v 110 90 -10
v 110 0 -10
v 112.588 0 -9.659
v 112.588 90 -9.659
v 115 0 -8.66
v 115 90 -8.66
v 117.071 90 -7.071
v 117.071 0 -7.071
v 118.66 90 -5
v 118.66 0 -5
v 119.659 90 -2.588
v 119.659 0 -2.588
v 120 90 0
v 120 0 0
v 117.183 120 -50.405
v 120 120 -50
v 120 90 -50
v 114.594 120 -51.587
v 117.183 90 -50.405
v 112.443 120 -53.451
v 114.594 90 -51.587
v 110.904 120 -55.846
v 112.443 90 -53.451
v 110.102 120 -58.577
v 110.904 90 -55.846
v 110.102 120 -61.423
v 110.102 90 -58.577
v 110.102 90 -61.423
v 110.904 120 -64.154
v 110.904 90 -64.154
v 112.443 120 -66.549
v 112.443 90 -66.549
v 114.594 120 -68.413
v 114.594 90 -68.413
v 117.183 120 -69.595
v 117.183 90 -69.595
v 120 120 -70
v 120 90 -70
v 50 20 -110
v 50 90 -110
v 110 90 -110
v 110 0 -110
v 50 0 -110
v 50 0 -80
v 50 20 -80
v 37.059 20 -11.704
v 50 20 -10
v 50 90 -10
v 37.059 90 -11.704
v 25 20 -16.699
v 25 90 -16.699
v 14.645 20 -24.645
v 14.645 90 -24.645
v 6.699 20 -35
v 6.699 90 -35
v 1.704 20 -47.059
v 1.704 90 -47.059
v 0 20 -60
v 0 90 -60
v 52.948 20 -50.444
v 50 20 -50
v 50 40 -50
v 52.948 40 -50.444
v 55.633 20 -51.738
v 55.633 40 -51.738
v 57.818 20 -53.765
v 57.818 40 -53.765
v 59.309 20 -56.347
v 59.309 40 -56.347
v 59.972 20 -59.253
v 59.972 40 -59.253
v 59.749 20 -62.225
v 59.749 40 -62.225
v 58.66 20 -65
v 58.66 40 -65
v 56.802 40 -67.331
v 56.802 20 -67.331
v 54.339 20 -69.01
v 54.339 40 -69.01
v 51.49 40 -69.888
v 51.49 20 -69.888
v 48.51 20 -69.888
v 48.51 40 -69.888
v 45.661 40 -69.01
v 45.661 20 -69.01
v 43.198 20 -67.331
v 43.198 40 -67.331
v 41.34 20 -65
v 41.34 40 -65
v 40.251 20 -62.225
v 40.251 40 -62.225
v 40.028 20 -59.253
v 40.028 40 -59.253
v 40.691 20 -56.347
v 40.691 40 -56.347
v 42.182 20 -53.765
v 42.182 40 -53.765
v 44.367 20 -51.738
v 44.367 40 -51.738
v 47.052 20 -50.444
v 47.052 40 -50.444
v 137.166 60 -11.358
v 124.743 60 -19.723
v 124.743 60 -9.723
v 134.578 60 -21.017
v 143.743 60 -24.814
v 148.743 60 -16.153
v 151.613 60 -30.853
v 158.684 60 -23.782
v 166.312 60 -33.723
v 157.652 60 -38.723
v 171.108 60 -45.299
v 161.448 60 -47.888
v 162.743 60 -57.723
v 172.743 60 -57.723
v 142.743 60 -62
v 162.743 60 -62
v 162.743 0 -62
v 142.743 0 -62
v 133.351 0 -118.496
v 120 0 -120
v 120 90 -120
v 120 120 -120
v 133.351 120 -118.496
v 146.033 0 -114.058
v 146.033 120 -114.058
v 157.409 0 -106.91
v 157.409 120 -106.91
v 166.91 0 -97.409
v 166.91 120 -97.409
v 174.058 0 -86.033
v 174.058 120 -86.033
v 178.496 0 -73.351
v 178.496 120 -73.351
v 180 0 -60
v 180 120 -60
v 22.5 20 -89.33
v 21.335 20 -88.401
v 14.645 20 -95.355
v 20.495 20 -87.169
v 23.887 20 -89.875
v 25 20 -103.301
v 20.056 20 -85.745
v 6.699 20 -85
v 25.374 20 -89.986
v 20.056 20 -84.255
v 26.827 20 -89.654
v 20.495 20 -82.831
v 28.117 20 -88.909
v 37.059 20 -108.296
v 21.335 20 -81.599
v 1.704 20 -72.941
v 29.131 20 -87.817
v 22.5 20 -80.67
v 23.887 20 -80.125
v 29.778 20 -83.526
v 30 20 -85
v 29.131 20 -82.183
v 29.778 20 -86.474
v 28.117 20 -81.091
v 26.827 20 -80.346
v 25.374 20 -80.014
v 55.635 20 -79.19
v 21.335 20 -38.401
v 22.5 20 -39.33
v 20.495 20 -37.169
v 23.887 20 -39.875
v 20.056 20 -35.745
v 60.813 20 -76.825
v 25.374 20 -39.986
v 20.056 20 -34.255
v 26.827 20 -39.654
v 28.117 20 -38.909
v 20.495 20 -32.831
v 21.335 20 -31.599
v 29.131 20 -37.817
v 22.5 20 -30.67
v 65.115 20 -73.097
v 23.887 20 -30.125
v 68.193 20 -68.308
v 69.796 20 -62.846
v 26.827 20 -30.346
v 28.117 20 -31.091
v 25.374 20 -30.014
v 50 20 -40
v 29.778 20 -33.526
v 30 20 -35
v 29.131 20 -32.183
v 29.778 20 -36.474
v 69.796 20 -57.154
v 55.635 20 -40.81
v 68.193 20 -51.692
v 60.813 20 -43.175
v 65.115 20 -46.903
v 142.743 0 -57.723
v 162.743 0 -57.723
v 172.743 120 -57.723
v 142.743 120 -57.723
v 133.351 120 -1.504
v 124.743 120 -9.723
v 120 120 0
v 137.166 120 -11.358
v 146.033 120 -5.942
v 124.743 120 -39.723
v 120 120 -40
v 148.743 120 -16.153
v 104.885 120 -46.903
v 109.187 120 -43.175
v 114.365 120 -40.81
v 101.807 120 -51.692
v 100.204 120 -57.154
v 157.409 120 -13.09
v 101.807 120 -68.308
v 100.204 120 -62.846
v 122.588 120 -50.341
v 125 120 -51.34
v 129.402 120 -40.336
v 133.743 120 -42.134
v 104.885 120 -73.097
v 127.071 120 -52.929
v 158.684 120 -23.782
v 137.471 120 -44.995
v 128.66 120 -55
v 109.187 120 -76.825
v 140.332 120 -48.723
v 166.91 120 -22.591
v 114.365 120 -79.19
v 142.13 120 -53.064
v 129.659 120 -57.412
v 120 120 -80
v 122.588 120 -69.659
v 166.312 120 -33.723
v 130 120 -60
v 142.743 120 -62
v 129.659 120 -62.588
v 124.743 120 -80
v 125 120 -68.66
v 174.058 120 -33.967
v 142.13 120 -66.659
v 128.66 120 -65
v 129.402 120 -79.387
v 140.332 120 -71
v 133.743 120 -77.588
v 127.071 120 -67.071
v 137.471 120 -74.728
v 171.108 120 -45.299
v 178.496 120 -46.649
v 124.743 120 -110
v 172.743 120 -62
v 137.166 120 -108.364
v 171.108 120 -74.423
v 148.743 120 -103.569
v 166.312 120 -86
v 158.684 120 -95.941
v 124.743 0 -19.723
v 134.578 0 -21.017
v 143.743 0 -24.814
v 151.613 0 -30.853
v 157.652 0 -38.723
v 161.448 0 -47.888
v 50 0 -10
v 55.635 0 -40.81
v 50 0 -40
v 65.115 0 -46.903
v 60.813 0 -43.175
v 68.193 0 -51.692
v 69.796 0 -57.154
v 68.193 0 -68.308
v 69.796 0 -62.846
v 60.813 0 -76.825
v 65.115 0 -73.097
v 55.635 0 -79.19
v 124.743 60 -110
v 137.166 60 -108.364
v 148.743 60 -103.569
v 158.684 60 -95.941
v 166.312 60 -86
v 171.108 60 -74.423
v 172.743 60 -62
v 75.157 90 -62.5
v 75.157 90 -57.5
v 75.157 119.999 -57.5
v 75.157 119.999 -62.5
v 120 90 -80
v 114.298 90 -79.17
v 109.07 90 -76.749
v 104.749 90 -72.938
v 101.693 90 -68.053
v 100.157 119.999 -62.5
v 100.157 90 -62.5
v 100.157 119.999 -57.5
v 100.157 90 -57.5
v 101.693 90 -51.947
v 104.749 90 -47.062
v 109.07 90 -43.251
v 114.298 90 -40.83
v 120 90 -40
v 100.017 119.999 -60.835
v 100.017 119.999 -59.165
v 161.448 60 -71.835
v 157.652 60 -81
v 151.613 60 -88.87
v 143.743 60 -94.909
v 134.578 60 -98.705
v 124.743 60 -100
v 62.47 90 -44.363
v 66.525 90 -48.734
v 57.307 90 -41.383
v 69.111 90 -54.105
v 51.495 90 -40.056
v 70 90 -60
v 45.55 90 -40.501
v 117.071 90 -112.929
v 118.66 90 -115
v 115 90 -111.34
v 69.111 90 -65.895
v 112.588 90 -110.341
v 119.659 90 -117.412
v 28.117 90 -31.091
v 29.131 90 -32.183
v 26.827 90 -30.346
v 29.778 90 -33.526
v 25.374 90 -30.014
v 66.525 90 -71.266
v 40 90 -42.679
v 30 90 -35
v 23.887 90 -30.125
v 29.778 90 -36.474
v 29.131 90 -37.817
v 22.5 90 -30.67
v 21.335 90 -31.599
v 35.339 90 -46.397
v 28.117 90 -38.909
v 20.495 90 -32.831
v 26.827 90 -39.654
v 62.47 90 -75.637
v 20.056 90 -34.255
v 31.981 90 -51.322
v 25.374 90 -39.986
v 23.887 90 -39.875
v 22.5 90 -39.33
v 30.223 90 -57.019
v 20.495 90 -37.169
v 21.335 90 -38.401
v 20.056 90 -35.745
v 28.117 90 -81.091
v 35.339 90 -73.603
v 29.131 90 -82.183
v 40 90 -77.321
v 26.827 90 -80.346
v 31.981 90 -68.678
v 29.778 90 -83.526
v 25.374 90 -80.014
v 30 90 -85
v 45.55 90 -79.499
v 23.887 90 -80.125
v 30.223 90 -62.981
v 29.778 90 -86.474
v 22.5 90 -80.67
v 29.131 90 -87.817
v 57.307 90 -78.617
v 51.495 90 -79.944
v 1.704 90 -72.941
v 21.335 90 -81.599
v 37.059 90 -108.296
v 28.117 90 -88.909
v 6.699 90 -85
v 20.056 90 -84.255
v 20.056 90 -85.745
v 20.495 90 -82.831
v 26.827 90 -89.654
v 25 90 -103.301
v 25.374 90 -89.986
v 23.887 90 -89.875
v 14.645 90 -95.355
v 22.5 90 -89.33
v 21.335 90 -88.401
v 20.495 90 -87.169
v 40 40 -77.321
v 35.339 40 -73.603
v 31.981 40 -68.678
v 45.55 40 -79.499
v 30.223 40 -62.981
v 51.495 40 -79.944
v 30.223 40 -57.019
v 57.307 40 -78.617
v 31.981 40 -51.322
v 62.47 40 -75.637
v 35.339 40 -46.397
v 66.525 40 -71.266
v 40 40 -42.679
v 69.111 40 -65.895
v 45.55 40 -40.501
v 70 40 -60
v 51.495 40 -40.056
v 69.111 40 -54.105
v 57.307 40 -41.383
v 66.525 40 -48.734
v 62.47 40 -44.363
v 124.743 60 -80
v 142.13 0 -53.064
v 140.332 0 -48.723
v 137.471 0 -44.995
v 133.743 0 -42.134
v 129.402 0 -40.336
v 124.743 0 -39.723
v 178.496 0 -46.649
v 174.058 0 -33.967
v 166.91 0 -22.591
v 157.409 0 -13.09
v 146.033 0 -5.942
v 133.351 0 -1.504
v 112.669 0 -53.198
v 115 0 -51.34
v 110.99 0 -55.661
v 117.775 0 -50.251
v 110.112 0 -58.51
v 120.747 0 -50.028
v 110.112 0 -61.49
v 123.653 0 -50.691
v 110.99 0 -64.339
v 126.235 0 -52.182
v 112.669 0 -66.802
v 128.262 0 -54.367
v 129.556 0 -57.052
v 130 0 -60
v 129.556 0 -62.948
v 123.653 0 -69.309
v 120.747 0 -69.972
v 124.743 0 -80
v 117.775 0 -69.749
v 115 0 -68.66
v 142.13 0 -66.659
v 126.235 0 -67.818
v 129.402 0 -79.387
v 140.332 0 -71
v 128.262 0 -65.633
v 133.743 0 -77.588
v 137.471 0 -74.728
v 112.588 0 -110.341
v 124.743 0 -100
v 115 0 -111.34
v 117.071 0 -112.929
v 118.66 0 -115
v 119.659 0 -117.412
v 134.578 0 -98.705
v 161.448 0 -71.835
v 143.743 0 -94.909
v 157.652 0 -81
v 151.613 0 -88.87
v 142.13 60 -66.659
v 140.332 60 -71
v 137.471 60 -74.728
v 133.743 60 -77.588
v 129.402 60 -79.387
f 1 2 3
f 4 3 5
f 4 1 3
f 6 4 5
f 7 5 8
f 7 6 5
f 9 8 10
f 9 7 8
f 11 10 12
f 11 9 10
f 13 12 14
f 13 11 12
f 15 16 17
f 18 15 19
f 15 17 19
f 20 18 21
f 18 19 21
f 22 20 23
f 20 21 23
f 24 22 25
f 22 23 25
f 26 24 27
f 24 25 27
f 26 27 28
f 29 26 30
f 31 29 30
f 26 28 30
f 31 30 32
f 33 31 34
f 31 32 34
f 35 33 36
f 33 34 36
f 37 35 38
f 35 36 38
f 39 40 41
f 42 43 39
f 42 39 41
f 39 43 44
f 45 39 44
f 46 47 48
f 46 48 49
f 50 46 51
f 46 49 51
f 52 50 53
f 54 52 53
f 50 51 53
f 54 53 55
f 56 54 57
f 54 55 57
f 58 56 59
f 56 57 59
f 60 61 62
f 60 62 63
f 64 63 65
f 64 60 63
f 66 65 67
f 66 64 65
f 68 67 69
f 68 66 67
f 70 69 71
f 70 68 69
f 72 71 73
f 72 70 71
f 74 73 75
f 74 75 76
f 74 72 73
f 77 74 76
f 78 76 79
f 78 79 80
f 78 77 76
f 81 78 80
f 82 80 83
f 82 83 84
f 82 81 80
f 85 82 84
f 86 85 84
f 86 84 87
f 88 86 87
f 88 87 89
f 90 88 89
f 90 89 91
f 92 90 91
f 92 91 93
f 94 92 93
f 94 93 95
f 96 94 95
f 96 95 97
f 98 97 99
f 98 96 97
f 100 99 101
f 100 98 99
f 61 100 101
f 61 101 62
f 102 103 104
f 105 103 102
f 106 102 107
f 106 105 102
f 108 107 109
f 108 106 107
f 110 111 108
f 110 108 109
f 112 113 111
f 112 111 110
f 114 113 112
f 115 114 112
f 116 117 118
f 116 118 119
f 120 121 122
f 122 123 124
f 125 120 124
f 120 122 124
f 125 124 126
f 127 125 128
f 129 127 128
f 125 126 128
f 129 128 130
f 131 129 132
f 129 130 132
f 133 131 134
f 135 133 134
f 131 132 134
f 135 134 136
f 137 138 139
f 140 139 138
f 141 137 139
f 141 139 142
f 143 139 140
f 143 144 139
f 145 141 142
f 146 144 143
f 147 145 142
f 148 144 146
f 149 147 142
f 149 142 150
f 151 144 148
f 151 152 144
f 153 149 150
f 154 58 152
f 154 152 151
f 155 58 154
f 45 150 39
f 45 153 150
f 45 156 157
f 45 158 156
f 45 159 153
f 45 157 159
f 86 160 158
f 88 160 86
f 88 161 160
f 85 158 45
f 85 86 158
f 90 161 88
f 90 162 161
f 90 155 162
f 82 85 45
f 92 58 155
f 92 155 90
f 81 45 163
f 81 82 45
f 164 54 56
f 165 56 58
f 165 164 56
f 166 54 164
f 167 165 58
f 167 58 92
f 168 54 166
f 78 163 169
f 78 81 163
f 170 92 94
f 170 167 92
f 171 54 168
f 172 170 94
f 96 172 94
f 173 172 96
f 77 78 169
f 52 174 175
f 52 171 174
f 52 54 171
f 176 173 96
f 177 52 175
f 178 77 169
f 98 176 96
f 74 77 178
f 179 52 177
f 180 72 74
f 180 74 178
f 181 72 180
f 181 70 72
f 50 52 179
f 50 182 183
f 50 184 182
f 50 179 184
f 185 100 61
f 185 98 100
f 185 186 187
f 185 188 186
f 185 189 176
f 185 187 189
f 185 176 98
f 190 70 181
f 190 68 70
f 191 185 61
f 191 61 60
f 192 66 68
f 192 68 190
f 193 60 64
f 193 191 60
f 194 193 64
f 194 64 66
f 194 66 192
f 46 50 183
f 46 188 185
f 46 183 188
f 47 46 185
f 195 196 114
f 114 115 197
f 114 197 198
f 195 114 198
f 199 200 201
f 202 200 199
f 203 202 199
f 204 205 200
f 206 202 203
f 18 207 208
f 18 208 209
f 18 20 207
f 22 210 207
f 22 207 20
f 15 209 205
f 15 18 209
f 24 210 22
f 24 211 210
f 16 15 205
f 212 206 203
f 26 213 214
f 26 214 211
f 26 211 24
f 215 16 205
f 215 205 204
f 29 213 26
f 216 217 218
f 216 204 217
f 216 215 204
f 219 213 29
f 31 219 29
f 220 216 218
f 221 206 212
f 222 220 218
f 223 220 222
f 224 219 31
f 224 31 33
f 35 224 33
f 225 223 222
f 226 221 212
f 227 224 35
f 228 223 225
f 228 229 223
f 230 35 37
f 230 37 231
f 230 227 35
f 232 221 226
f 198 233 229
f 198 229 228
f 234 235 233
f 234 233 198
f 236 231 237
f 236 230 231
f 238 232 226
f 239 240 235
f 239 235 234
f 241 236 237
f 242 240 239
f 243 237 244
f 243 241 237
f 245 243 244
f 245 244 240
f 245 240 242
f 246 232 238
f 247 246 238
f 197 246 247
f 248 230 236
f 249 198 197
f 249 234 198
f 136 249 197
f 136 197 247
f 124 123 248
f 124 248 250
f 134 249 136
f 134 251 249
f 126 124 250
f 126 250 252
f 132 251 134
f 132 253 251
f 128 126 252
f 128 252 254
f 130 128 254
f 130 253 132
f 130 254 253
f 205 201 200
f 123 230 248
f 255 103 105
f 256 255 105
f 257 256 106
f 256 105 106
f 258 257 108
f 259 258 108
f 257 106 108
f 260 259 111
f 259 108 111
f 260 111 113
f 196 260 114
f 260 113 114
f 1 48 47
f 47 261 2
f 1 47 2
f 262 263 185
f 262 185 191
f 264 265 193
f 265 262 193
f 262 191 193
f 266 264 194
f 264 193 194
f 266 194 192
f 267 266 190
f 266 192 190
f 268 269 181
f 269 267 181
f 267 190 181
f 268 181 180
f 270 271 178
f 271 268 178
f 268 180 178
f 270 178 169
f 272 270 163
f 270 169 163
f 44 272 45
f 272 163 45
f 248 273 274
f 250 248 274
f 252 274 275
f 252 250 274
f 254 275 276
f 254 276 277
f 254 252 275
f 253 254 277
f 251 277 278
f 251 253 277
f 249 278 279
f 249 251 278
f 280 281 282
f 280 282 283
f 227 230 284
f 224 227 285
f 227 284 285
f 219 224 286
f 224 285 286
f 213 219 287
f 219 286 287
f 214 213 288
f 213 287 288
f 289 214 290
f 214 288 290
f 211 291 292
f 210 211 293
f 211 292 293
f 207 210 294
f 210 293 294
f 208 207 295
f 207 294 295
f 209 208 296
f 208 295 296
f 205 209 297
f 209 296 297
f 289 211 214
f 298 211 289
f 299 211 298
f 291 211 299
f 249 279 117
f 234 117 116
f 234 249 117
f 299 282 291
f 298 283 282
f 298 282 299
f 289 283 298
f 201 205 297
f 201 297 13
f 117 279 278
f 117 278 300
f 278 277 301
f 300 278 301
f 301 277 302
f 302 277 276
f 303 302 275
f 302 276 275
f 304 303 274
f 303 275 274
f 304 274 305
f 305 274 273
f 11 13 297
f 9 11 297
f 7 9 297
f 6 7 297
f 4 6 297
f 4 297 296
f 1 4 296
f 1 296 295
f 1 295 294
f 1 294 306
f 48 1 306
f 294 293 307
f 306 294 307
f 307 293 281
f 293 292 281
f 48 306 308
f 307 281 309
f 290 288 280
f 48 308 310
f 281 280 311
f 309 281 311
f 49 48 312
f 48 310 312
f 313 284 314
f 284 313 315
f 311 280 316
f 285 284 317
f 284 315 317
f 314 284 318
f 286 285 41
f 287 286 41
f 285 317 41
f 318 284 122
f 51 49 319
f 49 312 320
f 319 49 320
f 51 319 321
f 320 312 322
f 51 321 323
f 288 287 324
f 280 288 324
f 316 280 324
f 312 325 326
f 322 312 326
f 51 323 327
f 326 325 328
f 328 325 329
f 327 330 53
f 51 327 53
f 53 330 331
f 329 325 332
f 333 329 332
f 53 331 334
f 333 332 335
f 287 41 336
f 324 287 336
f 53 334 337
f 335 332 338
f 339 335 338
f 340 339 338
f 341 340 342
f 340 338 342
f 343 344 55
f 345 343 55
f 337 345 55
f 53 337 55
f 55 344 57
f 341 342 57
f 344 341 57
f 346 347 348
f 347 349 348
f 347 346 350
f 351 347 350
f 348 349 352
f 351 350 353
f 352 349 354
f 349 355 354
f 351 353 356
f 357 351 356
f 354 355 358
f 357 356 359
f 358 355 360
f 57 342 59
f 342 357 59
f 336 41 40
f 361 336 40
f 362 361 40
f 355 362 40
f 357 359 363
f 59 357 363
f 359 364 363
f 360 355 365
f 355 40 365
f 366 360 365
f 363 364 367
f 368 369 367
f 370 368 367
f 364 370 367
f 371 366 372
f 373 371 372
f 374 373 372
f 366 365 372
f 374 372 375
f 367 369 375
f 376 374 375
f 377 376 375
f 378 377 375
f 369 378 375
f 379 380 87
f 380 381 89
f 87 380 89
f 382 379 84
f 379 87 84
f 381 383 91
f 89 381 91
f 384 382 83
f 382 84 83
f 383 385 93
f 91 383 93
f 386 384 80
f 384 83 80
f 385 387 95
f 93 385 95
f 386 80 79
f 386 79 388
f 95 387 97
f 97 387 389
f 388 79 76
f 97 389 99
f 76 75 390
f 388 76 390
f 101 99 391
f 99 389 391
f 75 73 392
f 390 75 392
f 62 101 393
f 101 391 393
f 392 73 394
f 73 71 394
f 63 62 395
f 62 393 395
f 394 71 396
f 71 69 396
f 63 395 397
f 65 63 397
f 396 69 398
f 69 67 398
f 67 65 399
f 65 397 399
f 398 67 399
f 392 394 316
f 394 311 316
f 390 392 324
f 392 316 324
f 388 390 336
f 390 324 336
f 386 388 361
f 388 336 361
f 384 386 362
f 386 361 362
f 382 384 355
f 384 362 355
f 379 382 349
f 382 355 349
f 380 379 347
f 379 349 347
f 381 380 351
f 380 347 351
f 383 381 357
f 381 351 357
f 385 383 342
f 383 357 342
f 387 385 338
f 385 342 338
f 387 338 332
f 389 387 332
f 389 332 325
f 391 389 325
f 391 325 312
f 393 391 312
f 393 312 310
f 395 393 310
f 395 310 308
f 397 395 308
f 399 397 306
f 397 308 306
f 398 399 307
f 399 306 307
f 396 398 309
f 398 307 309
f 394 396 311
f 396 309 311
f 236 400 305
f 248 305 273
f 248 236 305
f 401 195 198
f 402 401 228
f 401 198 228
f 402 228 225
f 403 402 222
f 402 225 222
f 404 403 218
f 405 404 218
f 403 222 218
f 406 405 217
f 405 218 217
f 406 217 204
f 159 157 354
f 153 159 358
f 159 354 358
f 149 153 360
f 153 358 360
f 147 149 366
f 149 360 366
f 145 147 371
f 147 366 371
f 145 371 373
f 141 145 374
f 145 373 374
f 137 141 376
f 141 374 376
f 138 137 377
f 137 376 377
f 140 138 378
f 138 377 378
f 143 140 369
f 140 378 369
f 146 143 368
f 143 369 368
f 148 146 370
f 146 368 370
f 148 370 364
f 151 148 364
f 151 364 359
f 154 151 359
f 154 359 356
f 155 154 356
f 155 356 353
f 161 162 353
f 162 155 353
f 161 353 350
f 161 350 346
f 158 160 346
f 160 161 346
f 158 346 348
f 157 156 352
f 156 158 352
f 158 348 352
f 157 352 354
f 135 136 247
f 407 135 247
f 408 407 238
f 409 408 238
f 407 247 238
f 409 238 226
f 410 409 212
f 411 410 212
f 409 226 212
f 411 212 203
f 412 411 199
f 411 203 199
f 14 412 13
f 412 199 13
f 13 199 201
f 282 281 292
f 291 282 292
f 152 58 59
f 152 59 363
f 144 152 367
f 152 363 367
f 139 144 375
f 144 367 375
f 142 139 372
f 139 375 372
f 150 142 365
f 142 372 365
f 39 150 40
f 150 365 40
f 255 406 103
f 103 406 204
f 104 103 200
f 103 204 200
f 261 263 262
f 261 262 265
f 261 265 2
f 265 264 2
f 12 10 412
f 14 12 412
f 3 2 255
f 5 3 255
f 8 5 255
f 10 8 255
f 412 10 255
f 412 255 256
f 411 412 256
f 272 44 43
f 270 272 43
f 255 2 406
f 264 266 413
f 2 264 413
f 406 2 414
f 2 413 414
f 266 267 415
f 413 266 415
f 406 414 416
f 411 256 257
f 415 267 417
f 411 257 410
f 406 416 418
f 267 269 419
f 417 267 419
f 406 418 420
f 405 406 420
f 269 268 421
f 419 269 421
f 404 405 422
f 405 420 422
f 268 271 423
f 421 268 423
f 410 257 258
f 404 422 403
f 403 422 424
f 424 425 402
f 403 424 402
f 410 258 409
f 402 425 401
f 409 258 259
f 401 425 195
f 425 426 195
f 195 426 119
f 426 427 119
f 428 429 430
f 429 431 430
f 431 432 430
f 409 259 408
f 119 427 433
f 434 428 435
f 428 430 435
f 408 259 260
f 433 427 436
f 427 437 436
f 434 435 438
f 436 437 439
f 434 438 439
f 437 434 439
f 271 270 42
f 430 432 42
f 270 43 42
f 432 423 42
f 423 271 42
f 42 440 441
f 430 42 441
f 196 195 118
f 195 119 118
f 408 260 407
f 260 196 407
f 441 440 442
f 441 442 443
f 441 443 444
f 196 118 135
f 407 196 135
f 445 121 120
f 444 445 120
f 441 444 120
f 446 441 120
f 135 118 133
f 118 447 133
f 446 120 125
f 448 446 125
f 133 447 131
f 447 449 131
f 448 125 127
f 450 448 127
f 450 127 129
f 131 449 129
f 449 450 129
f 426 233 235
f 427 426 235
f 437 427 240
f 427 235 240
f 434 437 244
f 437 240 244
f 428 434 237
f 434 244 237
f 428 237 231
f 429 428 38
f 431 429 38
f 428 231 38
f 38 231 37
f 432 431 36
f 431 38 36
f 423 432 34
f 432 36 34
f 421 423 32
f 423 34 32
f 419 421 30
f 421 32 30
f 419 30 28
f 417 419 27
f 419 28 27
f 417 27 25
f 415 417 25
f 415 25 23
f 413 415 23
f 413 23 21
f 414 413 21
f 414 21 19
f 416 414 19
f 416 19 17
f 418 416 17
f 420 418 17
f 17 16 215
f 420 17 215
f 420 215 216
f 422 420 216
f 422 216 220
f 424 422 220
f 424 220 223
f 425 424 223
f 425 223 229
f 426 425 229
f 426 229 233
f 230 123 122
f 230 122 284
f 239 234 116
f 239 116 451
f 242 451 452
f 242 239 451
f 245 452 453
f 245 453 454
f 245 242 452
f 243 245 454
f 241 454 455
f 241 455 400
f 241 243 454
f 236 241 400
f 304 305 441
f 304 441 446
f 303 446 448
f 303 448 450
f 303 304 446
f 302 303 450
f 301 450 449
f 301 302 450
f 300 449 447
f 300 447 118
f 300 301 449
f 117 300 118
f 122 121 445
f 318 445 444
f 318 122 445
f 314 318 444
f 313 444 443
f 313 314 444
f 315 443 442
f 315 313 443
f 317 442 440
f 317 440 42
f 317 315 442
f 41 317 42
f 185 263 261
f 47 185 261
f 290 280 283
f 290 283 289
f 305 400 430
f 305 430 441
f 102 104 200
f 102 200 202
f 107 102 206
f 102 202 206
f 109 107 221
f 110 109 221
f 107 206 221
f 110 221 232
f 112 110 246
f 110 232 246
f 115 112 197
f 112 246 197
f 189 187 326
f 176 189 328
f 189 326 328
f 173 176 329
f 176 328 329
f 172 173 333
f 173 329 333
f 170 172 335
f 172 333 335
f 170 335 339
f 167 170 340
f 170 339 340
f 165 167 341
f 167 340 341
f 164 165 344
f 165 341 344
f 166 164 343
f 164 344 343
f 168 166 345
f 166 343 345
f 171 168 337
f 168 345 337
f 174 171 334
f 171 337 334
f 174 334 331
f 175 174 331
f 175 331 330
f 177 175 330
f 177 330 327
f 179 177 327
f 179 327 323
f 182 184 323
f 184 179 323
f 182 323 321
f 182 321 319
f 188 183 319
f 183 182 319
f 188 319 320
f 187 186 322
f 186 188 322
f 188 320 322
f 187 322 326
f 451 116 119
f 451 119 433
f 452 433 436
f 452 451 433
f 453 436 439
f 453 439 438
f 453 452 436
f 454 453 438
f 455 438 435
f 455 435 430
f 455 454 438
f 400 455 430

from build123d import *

# Parameters (mm, degrees)
SKETCH1_W           = 180
SKETCH1_H           = 120
BOSS_EXTRUDE2_DEPTH = 120
SKETCH2_W           = 110
SKETCH2_H           = 10
CUT_EXTRUDE1_DEPTH  = 120
CUT_EXTRUDE2_DEPTH  = 120
CUT_EXTRUDE3_DEPTH  = 120
CUT_EXTRUDE4_DEPTH  = 120
SKETCH6_R           = 5
CUT_EXTRUDE5_DEPTH  = 120
SKETCH7_R           = 10
CUT_EXTRUDE6_DEPTH  = 120
CUT_EXTRUDE7_DEPTH  = 30
BOSS_EXTRUDE3_DEPTH = 30
CUT_EXTRUDE8_DEPTH  = 60
CUT_EXTRUDE9_DEPTH  = 60
CUT_EXTRUDE10_DEPTH = 60
CUT_EXTRUDE11_DEPTH = 60
SKETCH15_W          = 25
SKETCH15_H          = 5
BOSS_EXTRUDE5_DEPTH = 29.999
SKETCH16_R          = 10
CUT_EXTRUDE12_DEPTH = 125.999
SKETCH17_R          = 20
SKETCH17_R_2        = 10
CUT_EXTRUDE13_DEPTH = 30
SKETCH19_R          = 10
SKETCH19_R_2        = 5
CUT_EXTRUDE14_DEPTH = 20
SKETCH20_R          = 20
SKETCH20_R_2        = 10
CUT_EXTRUDE15_DEPTH = 84.461973219
BOSS_EXTRUDE6_DEPTH = 20
BOSS_EXTRUDE7_DEPTH = 20


with BuildPart() as part:
    # Sketch1 → Boss-Extrude2 (new body)
    with BuildSketch(Plane(origin=(0, 0, 0), x_dir=(1, 0, 0), z_dir=(0, 1, 0))):
        with Locations((90, 60)):
            Rectangle(SKETCH1_W, SKETCH1_H)
    extrude(amount=BOSS_EXTRUDE2_DEPTH)

    # Sketch2 → Cut-Extrude1 (cut)
    with BuildSketch(Plane(origin=(0, 0, 0), x_dir=(1, 0, 0), z_dir=(0, 1, 0))):
        with Locations((55, 115)):
            Rectangle(SKETCH2_W, SKETCH2_H)
        with Locations((55, 5)):
            Rectangle(SKETCH2_W, SKETCH2_H)
    extrude(amount=CUT_EXTRUDE1_DEPTH, mode=Mode.SUBTRACT)

    # Sketch3 → Cut-Extrude2 (cut)
    with BuildSketch(Plane(origin=(0, 120, 0), x_dir=(1, 0, 0), z_dir=(0, 1, 0))):
        with BuildLine():
            Line((110, 110), (110, 120))
            Line((110, 120), (120, 120))
            ThreePointArc((120, 120), (117.071067812, 112.928932188), (110, 110))
        make_face()
        with BuildLine():
            Line((120, 0), (110, 0))
            Line((110, 0), (110, 10))
            ThreePointArc((110, 10), (117.071067812, 7.071067812), (120, 0))
        make_face()
    extrude(amount=-CUT_EXTRUDE2_DEPTH, mode=Mode.SUBTRACT)

    # Sketch4 → Cut-Extrude3 (cut)
    with BuildSketch(Plane(origin=(0, 120, 0), x_dir=(1, 0, 0), z_dir=(0, 1, 0))):
        with BuildLine():
            Line((180, 120), (120, 120))
            ThreePointArc((120, 120), (162.426406871, 102.426406871), (180, 60))
            Line((180, 60), (180, 120))
        make_face()
        with BuildLine():
            Line((180, 0), (180, 60))
            ThreePointArc((180, 60), (162.426406871, 17.573593129), (120, 0))
            Line((120, 0), (180, 0))
        make_face()
    extrude(amount=-CUT_EXTRUDE3_DEPTH, mode=Mode.SUBTRACT)

    # Sketch5 → Cut-Extrude4 (cut)
    with BuildSketch(Plane(origin=(0, 120, 0), x_dir=(1, 0, 0), z_dir=(0, 1, 0))):
        with BuildLine():
            ThreePointArc((0, 59.999999737), (14.644660848, 95.355338966), (50, 110))
            Line((50, 110), (0, 110))
            Line((0, 110), (0, 59.999999737))
        make_face()
        with BuildLine():
            ThreePointArc((50, 10), (14.644661034, 24.644660848), (0, 59.999999737))
            Line((0, 59.999999737), (0, 10))
            Line((0, 10), (50, 10))
        make_face()
    extrude(amount=-CUT_EXTRUDE4_DEPTH, mode=Mode.SUBTRACT)

    # Sketch6 → Cut-Extrude5 (cut)
    with BuildSketch(Plane(origin=(0, 120, 0), x_dir=(1, 0, 0), z_dir=(0, 1, 0))):
        with Locations((25, 85)):
            Circle(SKETCH6_R)
        with Locations((25, 35)):
            Circle(SKETCH6_R)
    extrude(amount=-CUT_EXTRUDE5_DEPTH, mode=Mode.SUBTRACT)

    # Sketch7 → Cut-Extrude6 (cut)
    with BuildSketch(Plane(origin=(0, 120, 0), x_dir=(1, 0, 0), z_dir=(0, 1, 0))):
        with Locations((120, 60)):
            Circle(SKETCH7_R)
    extrude(amount=-CUT_EXTRUDE6_DEPTH, mode=Mode.SUBTRACT)

    # Sketch9 → Cut-Extrude7 (cut)
    with BuildSketch(Plane(origin=(0, 120, 0), x_dir=(1, 0, 0), z_dir=(0, 1, 0))):
        with BuildLine():
            Line((120, 120), (120, 0))
            ThreePointArc((120, 0), (117.071067812, 7.071067812), (110, 10))
            Line((110, 10), (50, 10))
            ThreePointArc((50, 10), (0, 60), (50, 110))
            Line((50, 110), (110, 110))
            ThreePointArc((110, 110), (117.071067812, 112.928932188), (120, 120))
        make_face()
    extrude(amount=-CUT_EXTRUDE7_DEPTH, mode=Mode.SUBTRACT)

    # Sketch10 → Boss-Extrude3 (add)
    with BuildSketch(Plane(origin=(0, 90, 0), x_dir=(1, 0, 0), z_dir=(0, 1, 0))):
        with BuildLine():
            Line((120, 70), (120, 80))
            ThreePointArc((120, 80), (100, 60), (120, 40))
            Line((120, 40), (120, 50))
            ThreePointArc((120, 50), (110, 60), (120, 70))
        make_face()
    extrude(amount=BOSS_EXTRUDE3_DEPTH)

    # Sketch11 → Cut-Extrude8 (cut)
    with BuildSketch(Plane(origin=(0, 120, 0), x_dir=(1, 0, 0), z_dir=(0, 1, 0))):
        with BuildLine():
            Line((124.743133772, 80), (124.743133772, 110))
            ThreePointArc((124.743133772, 110), (158.684259269, 95.941125497), (172.743133772, 62))
            Line((172.743133772, 62), (142.743133772, 62))
            ThreePointArc((142.743133772, 62), (137.471055833, 74.727922061), (124.743133772, 80))
        make_face()
    extrude(amount=-CUT_EXTRUDE8_DEPTH, mode=Mode.SUBTRACT)

    # Sketch12 → Cut-Extrude9 (cut)
    with BuildSketch(Plane(origin=(0, 120, 0), x_dir=(1, 0, 0), z_dir=(0, 1, 0))):
        with BuildLine():
            Line((124.743133772, 39.722678499), (124.743133772, 9.722678499))
            ThreePointArc((124.743133772, 9.722678499), (158.684259269, 23.781553002), (172.743133772, 57.722678499))
            Line((172.743133772, 57.722678499), (142.743133772, 57.722678499))
            ThreePointArc((142.743133772, 57.722678499), (137.471055833, 44.994756437), (124.743133772, 39.722678499))
        make_face()
    extrude(amount=-CUT_EXTRUDE9_DEPTH, mode=Mode.SUBTRACT)

    # Sketch13 → Cut-Extrude10 (cut)
    with BuildSketch(Plane(origin=(0, 60, 0), x_dir=(1, 0, 0), z_dir=(0, 1, 0))):
        with BuildLine():
            Line((124.743133772, 80), (124.743133772, 100))
            ThreePointArc((124.743133772, 100), (151.613191457, 88.870057685), (162.743133772, 62))
            Line((162.743133772, 62), (142.743133772, 62))
            ThreePointArc((142.743133772, 62), (137.471055833, 74.727922061), (124.743133772, 80))
        make_face()
    extrude(amount=-CUT_EXTRUDE10_DEPTH, mode=Mode.SUBTRACT)

    # Sketch14 → Cut-Extrude11 (cut)
    with BuildSketch(Plane(origin=(0, 60, 0), x_dir=(1, 0, 0), z_dir=(0, 1, 0))):
        with BuildLine():
            Line((124.743133772, 39.722678499), (124.743133772, 19.722678499))
            ThreePointArc((124.743133772, 19.722678499), (151.613191457, 30.852620814), (162.743133772, 57.722678499))
            Line((162.743133772, 57.722678499), (142.743133772, 57.722678499))
            ThreePointArc((142.743133772, 57.722678499), (137.471055833, 44.994756437), (124.743133772, 39.722678499))
        make_face()
    extrude(amount=-CUT_EXTRUDE11_DEPTH, mode=Mode.SUBTRACT)

    # Sketch15 → Boss-Extrude5 (add)
    with BuildSketch(Plane(origin=(0, 90, 0), x_dir=(1, 0, 0), z_dir=(0, 1, 0))):
        with Locations((87.656865167, 60)):
            Rectangle(SKETCH15_W, SKETCH15_H)
    extrude(amount=BOSS_EXTRUDE5_DEPTH)

    # Sketch16 → Cut-Extrude12 (cut)
    with BuildSketch(Plane(origin=(0, 90, 0), x_dir=(1, 0, 0), z_dir=(0, 1, 0))):
        with Locations((50, 60)):
            Circle(SKETCH16_R)
    extrude(amount=-CUT_EXTRUDE12_DEPTH, mode=Mode.SUBTRACT)

    # Sketch17 → Cut-Extrude13 (cut)
    with BuildSketch(Plane(origin=(0, 90, 0), x_dir=(1, 0, 0), z_dir=(0, 1, 0))):
        with Locations((50, 60)):
            Circle(SKETCH17_R)
        with Locations((50, 60)):
            Circle(SKETCH17_R_2, mode=Mode.SUBTRACT)
    extrude(amount=-CUT_EXTRUDE13_DEPTH, mode=Mode.SUBTRACT)

    # Sketch19 → Cut-Extrude14 (cut)
    with BuildSketch(Plane(origin=(0, 0, 0), x_dir=(-1, 0, 0), z_dir=(0, -1, 0))):
        with Locations((-50, 60)):
            Circle(SKETCH19_R)
        with BuildLine():
            Line((-50, 110), (-50, 10))
            ThreePointArc((-50, 10), (0, 60), (-50, 110))
        make_face()
        with Locations((-25, 35)):
            Circle(SKETCH19_R_2, mode=Mode.SUBTRACT)
        with Locations((-25, 85)):
            Circle(SKETCH19_R_2, mode=Mode.SUBTRACT)
    extrude(amount=-CUT_EXTRUDE14_DEPTH, mode=Mode.SUBTRACT)

    # Sketch20 → Cut-Extrude15 (cut)
    with BuildSketch(Plane(origin=(0, 60, 0), x_dir=(1, 0, 0), z_dir=(0, 1, 0))):
        with Locations((50, 60)):
            Circle(SKETCH20_R)
        with Locations((50, 60)):
            Circle(SKETCH20_R_2, mode=Mode.SUBTRACT)
    extrude(amount=-CUT_EXTRUDE15_DEPTH, mode=Mode.SUBTRACT)

    # Sketch21 → Boss-Extrude6 (add)
    with BuildSketch(Plane.XZ.offset(-20)):
        with BuildLine():
            Line((50, -70), (50, -80))
            ThreePointArc((50, -80), (30, -60), (50, -40))
            Line((50, -40), (50, -50))
            ThreePointArc((50, -50), (40, -60), (50, -70))
        make_face()
    extrude(amount=-BOSS_EXTRUDE6_DEPTH)

    # Sketch22 → Boss-Extrude7 (add)
    with BuildSketch(Plane.XZ.offset(-20)):
        with BuildLine():
            Line((50, -70), (50, -80))
            ThreePointArc((50, -80), (70, -60), (50, -40))
            Line((50, -40), (50, -50))
            ThreePointArc((50, -50), (60, -60), (50, -70))
        make_face()
    extrude(amount=-BOSS_EXTRUDE7_DEPTH)


solid = part.part
